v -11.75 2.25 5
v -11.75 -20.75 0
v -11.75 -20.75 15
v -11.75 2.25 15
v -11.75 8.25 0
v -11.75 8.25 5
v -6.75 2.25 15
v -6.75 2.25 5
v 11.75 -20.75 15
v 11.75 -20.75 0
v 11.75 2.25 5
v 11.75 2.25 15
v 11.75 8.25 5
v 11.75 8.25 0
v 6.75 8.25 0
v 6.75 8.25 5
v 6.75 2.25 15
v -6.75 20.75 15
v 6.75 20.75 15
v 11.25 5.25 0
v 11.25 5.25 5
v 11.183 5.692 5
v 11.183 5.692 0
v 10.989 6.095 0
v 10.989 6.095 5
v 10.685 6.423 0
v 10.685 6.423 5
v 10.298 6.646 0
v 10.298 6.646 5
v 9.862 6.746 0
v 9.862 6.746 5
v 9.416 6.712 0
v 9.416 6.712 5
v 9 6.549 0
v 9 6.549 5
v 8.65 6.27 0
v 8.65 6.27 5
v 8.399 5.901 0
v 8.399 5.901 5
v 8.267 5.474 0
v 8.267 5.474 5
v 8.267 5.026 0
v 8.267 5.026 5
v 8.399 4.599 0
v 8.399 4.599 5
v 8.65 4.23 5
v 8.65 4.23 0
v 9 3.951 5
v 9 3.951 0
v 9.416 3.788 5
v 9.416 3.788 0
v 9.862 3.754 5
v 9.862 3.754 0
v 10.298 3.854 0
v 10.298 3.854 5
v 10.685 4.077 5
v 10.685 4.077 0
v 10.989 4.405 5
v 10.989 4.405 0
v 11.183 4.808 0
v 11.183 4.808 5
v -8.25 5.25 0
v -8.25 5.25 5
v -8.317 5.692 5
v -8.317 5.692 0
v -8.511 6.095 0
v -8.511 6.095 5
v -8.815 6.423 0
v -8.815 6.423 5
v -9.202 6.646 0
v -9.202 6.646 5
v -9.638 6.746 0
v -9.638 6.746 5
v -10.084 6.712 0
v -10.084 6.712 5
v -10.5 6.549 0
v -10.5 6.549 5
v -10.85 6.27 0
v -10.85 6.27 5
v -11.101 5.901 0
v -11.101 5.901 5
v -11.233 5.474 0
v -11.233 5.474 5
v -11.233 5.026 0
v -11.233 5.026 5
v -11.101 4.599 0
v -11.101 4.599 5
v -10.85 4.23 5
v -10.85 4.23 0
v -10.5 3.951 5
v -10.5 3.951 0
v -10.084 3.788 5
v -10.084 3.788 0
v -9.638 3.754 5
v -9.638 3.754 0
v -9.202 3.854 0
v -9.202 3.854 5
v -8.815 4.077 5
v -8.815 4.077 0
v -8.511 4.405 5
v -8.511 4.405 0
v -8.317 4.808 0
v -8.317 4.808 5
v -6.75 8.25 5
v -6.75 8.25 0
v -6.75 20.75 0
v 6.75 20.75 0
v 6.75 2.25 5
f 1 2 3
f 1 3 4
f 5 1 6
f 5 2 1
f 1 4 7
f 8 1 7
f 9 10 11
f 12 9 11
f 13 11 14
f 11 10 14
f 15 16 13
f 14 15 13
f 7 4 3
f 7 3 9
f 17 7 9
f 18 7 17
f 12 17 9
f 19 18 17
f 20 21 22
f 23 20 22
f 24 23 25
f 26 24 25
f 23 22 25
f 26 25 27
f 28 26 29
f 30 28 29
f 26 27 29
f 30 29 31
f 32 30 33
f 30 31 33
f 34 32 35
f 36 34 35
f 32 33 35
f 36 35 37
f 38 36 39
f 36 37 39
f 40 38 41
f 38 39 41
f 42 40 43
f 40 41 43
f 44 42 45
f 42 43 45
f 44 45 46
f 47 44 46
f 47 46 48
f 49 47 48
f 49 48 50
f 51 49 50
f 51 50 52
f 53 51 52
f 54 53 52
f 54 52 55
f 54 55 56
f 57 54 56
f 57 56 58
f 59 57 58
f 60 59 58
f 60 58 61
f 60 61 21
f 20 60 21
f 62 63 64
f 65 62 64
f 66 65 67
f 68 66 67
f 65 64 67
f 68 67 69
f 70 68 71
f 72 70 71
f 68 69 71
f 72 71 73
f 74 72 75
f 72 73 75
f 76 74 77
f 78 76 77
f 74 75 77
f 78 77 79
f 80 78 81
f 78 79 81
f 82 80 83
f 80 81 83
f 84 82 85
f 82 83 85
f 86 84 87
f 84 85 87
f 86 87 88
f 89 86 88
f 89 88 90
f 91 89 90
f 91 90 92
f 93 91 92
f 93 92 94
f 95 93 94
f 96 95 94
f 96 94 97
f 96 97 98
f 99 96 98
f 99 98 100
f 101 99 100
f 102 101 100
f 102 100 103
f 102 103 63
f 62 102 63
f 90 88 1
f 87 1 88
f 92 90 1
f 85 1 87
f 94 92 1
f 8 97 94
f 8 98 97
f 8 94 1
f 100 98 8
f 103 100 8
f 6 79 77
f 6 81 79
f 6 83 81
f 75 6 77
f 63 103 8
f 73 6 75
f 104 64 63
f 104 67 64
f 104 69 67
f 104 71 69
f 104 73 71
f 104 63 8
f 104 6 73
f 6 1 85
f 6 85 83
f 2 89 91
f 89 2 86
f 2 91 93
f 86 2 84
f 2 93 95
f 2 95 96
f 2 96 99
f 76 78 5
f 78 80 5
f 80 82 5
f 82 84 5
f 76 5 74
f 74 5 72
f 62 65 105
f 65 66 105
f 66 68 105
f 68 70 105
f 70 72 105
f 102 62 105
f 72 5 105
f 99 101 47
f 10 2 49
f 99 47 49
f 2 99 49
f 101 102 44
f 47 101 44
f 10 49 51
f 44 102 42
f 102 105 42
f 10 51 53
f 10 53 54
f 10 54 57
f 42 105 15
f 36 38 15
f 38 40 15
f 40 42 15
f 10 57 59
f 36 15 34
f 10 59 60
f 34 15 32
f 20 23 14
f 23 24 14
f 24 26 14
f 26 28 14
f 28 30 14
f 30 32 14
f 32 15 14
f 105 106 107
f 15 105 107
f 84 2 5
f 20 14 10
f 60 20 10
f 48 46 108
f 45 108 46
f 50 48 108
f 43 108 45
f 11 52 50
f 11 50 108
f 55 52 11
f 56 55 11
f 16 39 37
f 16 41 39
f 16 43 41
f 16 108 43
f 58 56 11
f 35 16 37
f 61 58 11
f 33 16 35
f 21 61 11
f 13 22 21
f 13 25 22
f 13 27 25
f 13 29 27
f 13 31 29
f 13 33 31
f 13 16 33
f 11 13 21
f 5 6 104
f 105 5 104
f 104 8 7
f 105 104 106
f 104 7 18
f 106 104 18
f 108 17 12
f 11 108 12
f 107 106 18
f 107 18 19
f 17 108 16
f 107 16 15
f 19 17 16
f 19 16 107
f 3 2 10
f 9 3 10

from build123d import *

# Parameters (mm, degrees)
SKETCH_1_W          = 23.5
SKETCH_1_H          = 41.5
EXTRUDE_1_DEPTH     = 15
SKETCH_2_W          = 5
SKETCH_2_H          = 18.5
CUT_EXTRUDE_1_DEPTH = 10
SKETCH_3_W          = 5
SKETCH_3_H          = 12.5
CUT_EXTRUDE_2_DEPTH = 6
SKETCH_4_R          = 1.5
CUT_EXTRUDE_3_DEPTH = 6


with BuildPart() as part:
    # 草图1 → 凸台-拉伸1 (new body)
    with BuildSketch(Plane.XY):
        Rectangle(SKETCH_1_W, SKETCH_1_H)
    extrude(amount=EXTRUDE_1_DEPTH)

    # 草图2 → 切除-拉伸1 (cut)
    with BuildSketch(Plane.XY.offset(15)):
        with Locations((-9.25, 11.5)):
            Rectangle(SKETCH_2_W, SKETCH_2_H)
        with Locations((9.25, 11.5)):
            Rectangle(SKETCH_2_W, SKETCH_2_H)
    extrude(amount=-CUT_EXTRUDE_1_DEPTH, mode=Mode.SUBTRACT)

    # 草图3 → 切除-拉伸2 (cut, through all)
    with BuildSketch(Plane.XY.offset(5)):
        with Locations((-9.25, 14.5)):
            Rectangle(SKETCH_3_W, SKETCH_3_H)
        with Locations((9.25, 14.5)):
            Rectangle(SKETCH_3_W, SKETCH_3_H)
    extrude(amount=-CUT_EXTRUDE_2_DEPTH, mode=Mode.SUBTRACT)

    # 草图4 → 切除-拉伸3 (cut, through all)
    with BuildSketch(Plane.XY.offset(5)):
        with Locations((-9.75, 5.25)):
            Circle(SKETCH_4_R)
        with Locations((9.75, 5.25)):
            Circle(SKETCH_4_R)
    extrude(amount=-CUT_EXTRUDE_3_DEPTH, mode=Mode.SUBTRACT)


solid = part.part
